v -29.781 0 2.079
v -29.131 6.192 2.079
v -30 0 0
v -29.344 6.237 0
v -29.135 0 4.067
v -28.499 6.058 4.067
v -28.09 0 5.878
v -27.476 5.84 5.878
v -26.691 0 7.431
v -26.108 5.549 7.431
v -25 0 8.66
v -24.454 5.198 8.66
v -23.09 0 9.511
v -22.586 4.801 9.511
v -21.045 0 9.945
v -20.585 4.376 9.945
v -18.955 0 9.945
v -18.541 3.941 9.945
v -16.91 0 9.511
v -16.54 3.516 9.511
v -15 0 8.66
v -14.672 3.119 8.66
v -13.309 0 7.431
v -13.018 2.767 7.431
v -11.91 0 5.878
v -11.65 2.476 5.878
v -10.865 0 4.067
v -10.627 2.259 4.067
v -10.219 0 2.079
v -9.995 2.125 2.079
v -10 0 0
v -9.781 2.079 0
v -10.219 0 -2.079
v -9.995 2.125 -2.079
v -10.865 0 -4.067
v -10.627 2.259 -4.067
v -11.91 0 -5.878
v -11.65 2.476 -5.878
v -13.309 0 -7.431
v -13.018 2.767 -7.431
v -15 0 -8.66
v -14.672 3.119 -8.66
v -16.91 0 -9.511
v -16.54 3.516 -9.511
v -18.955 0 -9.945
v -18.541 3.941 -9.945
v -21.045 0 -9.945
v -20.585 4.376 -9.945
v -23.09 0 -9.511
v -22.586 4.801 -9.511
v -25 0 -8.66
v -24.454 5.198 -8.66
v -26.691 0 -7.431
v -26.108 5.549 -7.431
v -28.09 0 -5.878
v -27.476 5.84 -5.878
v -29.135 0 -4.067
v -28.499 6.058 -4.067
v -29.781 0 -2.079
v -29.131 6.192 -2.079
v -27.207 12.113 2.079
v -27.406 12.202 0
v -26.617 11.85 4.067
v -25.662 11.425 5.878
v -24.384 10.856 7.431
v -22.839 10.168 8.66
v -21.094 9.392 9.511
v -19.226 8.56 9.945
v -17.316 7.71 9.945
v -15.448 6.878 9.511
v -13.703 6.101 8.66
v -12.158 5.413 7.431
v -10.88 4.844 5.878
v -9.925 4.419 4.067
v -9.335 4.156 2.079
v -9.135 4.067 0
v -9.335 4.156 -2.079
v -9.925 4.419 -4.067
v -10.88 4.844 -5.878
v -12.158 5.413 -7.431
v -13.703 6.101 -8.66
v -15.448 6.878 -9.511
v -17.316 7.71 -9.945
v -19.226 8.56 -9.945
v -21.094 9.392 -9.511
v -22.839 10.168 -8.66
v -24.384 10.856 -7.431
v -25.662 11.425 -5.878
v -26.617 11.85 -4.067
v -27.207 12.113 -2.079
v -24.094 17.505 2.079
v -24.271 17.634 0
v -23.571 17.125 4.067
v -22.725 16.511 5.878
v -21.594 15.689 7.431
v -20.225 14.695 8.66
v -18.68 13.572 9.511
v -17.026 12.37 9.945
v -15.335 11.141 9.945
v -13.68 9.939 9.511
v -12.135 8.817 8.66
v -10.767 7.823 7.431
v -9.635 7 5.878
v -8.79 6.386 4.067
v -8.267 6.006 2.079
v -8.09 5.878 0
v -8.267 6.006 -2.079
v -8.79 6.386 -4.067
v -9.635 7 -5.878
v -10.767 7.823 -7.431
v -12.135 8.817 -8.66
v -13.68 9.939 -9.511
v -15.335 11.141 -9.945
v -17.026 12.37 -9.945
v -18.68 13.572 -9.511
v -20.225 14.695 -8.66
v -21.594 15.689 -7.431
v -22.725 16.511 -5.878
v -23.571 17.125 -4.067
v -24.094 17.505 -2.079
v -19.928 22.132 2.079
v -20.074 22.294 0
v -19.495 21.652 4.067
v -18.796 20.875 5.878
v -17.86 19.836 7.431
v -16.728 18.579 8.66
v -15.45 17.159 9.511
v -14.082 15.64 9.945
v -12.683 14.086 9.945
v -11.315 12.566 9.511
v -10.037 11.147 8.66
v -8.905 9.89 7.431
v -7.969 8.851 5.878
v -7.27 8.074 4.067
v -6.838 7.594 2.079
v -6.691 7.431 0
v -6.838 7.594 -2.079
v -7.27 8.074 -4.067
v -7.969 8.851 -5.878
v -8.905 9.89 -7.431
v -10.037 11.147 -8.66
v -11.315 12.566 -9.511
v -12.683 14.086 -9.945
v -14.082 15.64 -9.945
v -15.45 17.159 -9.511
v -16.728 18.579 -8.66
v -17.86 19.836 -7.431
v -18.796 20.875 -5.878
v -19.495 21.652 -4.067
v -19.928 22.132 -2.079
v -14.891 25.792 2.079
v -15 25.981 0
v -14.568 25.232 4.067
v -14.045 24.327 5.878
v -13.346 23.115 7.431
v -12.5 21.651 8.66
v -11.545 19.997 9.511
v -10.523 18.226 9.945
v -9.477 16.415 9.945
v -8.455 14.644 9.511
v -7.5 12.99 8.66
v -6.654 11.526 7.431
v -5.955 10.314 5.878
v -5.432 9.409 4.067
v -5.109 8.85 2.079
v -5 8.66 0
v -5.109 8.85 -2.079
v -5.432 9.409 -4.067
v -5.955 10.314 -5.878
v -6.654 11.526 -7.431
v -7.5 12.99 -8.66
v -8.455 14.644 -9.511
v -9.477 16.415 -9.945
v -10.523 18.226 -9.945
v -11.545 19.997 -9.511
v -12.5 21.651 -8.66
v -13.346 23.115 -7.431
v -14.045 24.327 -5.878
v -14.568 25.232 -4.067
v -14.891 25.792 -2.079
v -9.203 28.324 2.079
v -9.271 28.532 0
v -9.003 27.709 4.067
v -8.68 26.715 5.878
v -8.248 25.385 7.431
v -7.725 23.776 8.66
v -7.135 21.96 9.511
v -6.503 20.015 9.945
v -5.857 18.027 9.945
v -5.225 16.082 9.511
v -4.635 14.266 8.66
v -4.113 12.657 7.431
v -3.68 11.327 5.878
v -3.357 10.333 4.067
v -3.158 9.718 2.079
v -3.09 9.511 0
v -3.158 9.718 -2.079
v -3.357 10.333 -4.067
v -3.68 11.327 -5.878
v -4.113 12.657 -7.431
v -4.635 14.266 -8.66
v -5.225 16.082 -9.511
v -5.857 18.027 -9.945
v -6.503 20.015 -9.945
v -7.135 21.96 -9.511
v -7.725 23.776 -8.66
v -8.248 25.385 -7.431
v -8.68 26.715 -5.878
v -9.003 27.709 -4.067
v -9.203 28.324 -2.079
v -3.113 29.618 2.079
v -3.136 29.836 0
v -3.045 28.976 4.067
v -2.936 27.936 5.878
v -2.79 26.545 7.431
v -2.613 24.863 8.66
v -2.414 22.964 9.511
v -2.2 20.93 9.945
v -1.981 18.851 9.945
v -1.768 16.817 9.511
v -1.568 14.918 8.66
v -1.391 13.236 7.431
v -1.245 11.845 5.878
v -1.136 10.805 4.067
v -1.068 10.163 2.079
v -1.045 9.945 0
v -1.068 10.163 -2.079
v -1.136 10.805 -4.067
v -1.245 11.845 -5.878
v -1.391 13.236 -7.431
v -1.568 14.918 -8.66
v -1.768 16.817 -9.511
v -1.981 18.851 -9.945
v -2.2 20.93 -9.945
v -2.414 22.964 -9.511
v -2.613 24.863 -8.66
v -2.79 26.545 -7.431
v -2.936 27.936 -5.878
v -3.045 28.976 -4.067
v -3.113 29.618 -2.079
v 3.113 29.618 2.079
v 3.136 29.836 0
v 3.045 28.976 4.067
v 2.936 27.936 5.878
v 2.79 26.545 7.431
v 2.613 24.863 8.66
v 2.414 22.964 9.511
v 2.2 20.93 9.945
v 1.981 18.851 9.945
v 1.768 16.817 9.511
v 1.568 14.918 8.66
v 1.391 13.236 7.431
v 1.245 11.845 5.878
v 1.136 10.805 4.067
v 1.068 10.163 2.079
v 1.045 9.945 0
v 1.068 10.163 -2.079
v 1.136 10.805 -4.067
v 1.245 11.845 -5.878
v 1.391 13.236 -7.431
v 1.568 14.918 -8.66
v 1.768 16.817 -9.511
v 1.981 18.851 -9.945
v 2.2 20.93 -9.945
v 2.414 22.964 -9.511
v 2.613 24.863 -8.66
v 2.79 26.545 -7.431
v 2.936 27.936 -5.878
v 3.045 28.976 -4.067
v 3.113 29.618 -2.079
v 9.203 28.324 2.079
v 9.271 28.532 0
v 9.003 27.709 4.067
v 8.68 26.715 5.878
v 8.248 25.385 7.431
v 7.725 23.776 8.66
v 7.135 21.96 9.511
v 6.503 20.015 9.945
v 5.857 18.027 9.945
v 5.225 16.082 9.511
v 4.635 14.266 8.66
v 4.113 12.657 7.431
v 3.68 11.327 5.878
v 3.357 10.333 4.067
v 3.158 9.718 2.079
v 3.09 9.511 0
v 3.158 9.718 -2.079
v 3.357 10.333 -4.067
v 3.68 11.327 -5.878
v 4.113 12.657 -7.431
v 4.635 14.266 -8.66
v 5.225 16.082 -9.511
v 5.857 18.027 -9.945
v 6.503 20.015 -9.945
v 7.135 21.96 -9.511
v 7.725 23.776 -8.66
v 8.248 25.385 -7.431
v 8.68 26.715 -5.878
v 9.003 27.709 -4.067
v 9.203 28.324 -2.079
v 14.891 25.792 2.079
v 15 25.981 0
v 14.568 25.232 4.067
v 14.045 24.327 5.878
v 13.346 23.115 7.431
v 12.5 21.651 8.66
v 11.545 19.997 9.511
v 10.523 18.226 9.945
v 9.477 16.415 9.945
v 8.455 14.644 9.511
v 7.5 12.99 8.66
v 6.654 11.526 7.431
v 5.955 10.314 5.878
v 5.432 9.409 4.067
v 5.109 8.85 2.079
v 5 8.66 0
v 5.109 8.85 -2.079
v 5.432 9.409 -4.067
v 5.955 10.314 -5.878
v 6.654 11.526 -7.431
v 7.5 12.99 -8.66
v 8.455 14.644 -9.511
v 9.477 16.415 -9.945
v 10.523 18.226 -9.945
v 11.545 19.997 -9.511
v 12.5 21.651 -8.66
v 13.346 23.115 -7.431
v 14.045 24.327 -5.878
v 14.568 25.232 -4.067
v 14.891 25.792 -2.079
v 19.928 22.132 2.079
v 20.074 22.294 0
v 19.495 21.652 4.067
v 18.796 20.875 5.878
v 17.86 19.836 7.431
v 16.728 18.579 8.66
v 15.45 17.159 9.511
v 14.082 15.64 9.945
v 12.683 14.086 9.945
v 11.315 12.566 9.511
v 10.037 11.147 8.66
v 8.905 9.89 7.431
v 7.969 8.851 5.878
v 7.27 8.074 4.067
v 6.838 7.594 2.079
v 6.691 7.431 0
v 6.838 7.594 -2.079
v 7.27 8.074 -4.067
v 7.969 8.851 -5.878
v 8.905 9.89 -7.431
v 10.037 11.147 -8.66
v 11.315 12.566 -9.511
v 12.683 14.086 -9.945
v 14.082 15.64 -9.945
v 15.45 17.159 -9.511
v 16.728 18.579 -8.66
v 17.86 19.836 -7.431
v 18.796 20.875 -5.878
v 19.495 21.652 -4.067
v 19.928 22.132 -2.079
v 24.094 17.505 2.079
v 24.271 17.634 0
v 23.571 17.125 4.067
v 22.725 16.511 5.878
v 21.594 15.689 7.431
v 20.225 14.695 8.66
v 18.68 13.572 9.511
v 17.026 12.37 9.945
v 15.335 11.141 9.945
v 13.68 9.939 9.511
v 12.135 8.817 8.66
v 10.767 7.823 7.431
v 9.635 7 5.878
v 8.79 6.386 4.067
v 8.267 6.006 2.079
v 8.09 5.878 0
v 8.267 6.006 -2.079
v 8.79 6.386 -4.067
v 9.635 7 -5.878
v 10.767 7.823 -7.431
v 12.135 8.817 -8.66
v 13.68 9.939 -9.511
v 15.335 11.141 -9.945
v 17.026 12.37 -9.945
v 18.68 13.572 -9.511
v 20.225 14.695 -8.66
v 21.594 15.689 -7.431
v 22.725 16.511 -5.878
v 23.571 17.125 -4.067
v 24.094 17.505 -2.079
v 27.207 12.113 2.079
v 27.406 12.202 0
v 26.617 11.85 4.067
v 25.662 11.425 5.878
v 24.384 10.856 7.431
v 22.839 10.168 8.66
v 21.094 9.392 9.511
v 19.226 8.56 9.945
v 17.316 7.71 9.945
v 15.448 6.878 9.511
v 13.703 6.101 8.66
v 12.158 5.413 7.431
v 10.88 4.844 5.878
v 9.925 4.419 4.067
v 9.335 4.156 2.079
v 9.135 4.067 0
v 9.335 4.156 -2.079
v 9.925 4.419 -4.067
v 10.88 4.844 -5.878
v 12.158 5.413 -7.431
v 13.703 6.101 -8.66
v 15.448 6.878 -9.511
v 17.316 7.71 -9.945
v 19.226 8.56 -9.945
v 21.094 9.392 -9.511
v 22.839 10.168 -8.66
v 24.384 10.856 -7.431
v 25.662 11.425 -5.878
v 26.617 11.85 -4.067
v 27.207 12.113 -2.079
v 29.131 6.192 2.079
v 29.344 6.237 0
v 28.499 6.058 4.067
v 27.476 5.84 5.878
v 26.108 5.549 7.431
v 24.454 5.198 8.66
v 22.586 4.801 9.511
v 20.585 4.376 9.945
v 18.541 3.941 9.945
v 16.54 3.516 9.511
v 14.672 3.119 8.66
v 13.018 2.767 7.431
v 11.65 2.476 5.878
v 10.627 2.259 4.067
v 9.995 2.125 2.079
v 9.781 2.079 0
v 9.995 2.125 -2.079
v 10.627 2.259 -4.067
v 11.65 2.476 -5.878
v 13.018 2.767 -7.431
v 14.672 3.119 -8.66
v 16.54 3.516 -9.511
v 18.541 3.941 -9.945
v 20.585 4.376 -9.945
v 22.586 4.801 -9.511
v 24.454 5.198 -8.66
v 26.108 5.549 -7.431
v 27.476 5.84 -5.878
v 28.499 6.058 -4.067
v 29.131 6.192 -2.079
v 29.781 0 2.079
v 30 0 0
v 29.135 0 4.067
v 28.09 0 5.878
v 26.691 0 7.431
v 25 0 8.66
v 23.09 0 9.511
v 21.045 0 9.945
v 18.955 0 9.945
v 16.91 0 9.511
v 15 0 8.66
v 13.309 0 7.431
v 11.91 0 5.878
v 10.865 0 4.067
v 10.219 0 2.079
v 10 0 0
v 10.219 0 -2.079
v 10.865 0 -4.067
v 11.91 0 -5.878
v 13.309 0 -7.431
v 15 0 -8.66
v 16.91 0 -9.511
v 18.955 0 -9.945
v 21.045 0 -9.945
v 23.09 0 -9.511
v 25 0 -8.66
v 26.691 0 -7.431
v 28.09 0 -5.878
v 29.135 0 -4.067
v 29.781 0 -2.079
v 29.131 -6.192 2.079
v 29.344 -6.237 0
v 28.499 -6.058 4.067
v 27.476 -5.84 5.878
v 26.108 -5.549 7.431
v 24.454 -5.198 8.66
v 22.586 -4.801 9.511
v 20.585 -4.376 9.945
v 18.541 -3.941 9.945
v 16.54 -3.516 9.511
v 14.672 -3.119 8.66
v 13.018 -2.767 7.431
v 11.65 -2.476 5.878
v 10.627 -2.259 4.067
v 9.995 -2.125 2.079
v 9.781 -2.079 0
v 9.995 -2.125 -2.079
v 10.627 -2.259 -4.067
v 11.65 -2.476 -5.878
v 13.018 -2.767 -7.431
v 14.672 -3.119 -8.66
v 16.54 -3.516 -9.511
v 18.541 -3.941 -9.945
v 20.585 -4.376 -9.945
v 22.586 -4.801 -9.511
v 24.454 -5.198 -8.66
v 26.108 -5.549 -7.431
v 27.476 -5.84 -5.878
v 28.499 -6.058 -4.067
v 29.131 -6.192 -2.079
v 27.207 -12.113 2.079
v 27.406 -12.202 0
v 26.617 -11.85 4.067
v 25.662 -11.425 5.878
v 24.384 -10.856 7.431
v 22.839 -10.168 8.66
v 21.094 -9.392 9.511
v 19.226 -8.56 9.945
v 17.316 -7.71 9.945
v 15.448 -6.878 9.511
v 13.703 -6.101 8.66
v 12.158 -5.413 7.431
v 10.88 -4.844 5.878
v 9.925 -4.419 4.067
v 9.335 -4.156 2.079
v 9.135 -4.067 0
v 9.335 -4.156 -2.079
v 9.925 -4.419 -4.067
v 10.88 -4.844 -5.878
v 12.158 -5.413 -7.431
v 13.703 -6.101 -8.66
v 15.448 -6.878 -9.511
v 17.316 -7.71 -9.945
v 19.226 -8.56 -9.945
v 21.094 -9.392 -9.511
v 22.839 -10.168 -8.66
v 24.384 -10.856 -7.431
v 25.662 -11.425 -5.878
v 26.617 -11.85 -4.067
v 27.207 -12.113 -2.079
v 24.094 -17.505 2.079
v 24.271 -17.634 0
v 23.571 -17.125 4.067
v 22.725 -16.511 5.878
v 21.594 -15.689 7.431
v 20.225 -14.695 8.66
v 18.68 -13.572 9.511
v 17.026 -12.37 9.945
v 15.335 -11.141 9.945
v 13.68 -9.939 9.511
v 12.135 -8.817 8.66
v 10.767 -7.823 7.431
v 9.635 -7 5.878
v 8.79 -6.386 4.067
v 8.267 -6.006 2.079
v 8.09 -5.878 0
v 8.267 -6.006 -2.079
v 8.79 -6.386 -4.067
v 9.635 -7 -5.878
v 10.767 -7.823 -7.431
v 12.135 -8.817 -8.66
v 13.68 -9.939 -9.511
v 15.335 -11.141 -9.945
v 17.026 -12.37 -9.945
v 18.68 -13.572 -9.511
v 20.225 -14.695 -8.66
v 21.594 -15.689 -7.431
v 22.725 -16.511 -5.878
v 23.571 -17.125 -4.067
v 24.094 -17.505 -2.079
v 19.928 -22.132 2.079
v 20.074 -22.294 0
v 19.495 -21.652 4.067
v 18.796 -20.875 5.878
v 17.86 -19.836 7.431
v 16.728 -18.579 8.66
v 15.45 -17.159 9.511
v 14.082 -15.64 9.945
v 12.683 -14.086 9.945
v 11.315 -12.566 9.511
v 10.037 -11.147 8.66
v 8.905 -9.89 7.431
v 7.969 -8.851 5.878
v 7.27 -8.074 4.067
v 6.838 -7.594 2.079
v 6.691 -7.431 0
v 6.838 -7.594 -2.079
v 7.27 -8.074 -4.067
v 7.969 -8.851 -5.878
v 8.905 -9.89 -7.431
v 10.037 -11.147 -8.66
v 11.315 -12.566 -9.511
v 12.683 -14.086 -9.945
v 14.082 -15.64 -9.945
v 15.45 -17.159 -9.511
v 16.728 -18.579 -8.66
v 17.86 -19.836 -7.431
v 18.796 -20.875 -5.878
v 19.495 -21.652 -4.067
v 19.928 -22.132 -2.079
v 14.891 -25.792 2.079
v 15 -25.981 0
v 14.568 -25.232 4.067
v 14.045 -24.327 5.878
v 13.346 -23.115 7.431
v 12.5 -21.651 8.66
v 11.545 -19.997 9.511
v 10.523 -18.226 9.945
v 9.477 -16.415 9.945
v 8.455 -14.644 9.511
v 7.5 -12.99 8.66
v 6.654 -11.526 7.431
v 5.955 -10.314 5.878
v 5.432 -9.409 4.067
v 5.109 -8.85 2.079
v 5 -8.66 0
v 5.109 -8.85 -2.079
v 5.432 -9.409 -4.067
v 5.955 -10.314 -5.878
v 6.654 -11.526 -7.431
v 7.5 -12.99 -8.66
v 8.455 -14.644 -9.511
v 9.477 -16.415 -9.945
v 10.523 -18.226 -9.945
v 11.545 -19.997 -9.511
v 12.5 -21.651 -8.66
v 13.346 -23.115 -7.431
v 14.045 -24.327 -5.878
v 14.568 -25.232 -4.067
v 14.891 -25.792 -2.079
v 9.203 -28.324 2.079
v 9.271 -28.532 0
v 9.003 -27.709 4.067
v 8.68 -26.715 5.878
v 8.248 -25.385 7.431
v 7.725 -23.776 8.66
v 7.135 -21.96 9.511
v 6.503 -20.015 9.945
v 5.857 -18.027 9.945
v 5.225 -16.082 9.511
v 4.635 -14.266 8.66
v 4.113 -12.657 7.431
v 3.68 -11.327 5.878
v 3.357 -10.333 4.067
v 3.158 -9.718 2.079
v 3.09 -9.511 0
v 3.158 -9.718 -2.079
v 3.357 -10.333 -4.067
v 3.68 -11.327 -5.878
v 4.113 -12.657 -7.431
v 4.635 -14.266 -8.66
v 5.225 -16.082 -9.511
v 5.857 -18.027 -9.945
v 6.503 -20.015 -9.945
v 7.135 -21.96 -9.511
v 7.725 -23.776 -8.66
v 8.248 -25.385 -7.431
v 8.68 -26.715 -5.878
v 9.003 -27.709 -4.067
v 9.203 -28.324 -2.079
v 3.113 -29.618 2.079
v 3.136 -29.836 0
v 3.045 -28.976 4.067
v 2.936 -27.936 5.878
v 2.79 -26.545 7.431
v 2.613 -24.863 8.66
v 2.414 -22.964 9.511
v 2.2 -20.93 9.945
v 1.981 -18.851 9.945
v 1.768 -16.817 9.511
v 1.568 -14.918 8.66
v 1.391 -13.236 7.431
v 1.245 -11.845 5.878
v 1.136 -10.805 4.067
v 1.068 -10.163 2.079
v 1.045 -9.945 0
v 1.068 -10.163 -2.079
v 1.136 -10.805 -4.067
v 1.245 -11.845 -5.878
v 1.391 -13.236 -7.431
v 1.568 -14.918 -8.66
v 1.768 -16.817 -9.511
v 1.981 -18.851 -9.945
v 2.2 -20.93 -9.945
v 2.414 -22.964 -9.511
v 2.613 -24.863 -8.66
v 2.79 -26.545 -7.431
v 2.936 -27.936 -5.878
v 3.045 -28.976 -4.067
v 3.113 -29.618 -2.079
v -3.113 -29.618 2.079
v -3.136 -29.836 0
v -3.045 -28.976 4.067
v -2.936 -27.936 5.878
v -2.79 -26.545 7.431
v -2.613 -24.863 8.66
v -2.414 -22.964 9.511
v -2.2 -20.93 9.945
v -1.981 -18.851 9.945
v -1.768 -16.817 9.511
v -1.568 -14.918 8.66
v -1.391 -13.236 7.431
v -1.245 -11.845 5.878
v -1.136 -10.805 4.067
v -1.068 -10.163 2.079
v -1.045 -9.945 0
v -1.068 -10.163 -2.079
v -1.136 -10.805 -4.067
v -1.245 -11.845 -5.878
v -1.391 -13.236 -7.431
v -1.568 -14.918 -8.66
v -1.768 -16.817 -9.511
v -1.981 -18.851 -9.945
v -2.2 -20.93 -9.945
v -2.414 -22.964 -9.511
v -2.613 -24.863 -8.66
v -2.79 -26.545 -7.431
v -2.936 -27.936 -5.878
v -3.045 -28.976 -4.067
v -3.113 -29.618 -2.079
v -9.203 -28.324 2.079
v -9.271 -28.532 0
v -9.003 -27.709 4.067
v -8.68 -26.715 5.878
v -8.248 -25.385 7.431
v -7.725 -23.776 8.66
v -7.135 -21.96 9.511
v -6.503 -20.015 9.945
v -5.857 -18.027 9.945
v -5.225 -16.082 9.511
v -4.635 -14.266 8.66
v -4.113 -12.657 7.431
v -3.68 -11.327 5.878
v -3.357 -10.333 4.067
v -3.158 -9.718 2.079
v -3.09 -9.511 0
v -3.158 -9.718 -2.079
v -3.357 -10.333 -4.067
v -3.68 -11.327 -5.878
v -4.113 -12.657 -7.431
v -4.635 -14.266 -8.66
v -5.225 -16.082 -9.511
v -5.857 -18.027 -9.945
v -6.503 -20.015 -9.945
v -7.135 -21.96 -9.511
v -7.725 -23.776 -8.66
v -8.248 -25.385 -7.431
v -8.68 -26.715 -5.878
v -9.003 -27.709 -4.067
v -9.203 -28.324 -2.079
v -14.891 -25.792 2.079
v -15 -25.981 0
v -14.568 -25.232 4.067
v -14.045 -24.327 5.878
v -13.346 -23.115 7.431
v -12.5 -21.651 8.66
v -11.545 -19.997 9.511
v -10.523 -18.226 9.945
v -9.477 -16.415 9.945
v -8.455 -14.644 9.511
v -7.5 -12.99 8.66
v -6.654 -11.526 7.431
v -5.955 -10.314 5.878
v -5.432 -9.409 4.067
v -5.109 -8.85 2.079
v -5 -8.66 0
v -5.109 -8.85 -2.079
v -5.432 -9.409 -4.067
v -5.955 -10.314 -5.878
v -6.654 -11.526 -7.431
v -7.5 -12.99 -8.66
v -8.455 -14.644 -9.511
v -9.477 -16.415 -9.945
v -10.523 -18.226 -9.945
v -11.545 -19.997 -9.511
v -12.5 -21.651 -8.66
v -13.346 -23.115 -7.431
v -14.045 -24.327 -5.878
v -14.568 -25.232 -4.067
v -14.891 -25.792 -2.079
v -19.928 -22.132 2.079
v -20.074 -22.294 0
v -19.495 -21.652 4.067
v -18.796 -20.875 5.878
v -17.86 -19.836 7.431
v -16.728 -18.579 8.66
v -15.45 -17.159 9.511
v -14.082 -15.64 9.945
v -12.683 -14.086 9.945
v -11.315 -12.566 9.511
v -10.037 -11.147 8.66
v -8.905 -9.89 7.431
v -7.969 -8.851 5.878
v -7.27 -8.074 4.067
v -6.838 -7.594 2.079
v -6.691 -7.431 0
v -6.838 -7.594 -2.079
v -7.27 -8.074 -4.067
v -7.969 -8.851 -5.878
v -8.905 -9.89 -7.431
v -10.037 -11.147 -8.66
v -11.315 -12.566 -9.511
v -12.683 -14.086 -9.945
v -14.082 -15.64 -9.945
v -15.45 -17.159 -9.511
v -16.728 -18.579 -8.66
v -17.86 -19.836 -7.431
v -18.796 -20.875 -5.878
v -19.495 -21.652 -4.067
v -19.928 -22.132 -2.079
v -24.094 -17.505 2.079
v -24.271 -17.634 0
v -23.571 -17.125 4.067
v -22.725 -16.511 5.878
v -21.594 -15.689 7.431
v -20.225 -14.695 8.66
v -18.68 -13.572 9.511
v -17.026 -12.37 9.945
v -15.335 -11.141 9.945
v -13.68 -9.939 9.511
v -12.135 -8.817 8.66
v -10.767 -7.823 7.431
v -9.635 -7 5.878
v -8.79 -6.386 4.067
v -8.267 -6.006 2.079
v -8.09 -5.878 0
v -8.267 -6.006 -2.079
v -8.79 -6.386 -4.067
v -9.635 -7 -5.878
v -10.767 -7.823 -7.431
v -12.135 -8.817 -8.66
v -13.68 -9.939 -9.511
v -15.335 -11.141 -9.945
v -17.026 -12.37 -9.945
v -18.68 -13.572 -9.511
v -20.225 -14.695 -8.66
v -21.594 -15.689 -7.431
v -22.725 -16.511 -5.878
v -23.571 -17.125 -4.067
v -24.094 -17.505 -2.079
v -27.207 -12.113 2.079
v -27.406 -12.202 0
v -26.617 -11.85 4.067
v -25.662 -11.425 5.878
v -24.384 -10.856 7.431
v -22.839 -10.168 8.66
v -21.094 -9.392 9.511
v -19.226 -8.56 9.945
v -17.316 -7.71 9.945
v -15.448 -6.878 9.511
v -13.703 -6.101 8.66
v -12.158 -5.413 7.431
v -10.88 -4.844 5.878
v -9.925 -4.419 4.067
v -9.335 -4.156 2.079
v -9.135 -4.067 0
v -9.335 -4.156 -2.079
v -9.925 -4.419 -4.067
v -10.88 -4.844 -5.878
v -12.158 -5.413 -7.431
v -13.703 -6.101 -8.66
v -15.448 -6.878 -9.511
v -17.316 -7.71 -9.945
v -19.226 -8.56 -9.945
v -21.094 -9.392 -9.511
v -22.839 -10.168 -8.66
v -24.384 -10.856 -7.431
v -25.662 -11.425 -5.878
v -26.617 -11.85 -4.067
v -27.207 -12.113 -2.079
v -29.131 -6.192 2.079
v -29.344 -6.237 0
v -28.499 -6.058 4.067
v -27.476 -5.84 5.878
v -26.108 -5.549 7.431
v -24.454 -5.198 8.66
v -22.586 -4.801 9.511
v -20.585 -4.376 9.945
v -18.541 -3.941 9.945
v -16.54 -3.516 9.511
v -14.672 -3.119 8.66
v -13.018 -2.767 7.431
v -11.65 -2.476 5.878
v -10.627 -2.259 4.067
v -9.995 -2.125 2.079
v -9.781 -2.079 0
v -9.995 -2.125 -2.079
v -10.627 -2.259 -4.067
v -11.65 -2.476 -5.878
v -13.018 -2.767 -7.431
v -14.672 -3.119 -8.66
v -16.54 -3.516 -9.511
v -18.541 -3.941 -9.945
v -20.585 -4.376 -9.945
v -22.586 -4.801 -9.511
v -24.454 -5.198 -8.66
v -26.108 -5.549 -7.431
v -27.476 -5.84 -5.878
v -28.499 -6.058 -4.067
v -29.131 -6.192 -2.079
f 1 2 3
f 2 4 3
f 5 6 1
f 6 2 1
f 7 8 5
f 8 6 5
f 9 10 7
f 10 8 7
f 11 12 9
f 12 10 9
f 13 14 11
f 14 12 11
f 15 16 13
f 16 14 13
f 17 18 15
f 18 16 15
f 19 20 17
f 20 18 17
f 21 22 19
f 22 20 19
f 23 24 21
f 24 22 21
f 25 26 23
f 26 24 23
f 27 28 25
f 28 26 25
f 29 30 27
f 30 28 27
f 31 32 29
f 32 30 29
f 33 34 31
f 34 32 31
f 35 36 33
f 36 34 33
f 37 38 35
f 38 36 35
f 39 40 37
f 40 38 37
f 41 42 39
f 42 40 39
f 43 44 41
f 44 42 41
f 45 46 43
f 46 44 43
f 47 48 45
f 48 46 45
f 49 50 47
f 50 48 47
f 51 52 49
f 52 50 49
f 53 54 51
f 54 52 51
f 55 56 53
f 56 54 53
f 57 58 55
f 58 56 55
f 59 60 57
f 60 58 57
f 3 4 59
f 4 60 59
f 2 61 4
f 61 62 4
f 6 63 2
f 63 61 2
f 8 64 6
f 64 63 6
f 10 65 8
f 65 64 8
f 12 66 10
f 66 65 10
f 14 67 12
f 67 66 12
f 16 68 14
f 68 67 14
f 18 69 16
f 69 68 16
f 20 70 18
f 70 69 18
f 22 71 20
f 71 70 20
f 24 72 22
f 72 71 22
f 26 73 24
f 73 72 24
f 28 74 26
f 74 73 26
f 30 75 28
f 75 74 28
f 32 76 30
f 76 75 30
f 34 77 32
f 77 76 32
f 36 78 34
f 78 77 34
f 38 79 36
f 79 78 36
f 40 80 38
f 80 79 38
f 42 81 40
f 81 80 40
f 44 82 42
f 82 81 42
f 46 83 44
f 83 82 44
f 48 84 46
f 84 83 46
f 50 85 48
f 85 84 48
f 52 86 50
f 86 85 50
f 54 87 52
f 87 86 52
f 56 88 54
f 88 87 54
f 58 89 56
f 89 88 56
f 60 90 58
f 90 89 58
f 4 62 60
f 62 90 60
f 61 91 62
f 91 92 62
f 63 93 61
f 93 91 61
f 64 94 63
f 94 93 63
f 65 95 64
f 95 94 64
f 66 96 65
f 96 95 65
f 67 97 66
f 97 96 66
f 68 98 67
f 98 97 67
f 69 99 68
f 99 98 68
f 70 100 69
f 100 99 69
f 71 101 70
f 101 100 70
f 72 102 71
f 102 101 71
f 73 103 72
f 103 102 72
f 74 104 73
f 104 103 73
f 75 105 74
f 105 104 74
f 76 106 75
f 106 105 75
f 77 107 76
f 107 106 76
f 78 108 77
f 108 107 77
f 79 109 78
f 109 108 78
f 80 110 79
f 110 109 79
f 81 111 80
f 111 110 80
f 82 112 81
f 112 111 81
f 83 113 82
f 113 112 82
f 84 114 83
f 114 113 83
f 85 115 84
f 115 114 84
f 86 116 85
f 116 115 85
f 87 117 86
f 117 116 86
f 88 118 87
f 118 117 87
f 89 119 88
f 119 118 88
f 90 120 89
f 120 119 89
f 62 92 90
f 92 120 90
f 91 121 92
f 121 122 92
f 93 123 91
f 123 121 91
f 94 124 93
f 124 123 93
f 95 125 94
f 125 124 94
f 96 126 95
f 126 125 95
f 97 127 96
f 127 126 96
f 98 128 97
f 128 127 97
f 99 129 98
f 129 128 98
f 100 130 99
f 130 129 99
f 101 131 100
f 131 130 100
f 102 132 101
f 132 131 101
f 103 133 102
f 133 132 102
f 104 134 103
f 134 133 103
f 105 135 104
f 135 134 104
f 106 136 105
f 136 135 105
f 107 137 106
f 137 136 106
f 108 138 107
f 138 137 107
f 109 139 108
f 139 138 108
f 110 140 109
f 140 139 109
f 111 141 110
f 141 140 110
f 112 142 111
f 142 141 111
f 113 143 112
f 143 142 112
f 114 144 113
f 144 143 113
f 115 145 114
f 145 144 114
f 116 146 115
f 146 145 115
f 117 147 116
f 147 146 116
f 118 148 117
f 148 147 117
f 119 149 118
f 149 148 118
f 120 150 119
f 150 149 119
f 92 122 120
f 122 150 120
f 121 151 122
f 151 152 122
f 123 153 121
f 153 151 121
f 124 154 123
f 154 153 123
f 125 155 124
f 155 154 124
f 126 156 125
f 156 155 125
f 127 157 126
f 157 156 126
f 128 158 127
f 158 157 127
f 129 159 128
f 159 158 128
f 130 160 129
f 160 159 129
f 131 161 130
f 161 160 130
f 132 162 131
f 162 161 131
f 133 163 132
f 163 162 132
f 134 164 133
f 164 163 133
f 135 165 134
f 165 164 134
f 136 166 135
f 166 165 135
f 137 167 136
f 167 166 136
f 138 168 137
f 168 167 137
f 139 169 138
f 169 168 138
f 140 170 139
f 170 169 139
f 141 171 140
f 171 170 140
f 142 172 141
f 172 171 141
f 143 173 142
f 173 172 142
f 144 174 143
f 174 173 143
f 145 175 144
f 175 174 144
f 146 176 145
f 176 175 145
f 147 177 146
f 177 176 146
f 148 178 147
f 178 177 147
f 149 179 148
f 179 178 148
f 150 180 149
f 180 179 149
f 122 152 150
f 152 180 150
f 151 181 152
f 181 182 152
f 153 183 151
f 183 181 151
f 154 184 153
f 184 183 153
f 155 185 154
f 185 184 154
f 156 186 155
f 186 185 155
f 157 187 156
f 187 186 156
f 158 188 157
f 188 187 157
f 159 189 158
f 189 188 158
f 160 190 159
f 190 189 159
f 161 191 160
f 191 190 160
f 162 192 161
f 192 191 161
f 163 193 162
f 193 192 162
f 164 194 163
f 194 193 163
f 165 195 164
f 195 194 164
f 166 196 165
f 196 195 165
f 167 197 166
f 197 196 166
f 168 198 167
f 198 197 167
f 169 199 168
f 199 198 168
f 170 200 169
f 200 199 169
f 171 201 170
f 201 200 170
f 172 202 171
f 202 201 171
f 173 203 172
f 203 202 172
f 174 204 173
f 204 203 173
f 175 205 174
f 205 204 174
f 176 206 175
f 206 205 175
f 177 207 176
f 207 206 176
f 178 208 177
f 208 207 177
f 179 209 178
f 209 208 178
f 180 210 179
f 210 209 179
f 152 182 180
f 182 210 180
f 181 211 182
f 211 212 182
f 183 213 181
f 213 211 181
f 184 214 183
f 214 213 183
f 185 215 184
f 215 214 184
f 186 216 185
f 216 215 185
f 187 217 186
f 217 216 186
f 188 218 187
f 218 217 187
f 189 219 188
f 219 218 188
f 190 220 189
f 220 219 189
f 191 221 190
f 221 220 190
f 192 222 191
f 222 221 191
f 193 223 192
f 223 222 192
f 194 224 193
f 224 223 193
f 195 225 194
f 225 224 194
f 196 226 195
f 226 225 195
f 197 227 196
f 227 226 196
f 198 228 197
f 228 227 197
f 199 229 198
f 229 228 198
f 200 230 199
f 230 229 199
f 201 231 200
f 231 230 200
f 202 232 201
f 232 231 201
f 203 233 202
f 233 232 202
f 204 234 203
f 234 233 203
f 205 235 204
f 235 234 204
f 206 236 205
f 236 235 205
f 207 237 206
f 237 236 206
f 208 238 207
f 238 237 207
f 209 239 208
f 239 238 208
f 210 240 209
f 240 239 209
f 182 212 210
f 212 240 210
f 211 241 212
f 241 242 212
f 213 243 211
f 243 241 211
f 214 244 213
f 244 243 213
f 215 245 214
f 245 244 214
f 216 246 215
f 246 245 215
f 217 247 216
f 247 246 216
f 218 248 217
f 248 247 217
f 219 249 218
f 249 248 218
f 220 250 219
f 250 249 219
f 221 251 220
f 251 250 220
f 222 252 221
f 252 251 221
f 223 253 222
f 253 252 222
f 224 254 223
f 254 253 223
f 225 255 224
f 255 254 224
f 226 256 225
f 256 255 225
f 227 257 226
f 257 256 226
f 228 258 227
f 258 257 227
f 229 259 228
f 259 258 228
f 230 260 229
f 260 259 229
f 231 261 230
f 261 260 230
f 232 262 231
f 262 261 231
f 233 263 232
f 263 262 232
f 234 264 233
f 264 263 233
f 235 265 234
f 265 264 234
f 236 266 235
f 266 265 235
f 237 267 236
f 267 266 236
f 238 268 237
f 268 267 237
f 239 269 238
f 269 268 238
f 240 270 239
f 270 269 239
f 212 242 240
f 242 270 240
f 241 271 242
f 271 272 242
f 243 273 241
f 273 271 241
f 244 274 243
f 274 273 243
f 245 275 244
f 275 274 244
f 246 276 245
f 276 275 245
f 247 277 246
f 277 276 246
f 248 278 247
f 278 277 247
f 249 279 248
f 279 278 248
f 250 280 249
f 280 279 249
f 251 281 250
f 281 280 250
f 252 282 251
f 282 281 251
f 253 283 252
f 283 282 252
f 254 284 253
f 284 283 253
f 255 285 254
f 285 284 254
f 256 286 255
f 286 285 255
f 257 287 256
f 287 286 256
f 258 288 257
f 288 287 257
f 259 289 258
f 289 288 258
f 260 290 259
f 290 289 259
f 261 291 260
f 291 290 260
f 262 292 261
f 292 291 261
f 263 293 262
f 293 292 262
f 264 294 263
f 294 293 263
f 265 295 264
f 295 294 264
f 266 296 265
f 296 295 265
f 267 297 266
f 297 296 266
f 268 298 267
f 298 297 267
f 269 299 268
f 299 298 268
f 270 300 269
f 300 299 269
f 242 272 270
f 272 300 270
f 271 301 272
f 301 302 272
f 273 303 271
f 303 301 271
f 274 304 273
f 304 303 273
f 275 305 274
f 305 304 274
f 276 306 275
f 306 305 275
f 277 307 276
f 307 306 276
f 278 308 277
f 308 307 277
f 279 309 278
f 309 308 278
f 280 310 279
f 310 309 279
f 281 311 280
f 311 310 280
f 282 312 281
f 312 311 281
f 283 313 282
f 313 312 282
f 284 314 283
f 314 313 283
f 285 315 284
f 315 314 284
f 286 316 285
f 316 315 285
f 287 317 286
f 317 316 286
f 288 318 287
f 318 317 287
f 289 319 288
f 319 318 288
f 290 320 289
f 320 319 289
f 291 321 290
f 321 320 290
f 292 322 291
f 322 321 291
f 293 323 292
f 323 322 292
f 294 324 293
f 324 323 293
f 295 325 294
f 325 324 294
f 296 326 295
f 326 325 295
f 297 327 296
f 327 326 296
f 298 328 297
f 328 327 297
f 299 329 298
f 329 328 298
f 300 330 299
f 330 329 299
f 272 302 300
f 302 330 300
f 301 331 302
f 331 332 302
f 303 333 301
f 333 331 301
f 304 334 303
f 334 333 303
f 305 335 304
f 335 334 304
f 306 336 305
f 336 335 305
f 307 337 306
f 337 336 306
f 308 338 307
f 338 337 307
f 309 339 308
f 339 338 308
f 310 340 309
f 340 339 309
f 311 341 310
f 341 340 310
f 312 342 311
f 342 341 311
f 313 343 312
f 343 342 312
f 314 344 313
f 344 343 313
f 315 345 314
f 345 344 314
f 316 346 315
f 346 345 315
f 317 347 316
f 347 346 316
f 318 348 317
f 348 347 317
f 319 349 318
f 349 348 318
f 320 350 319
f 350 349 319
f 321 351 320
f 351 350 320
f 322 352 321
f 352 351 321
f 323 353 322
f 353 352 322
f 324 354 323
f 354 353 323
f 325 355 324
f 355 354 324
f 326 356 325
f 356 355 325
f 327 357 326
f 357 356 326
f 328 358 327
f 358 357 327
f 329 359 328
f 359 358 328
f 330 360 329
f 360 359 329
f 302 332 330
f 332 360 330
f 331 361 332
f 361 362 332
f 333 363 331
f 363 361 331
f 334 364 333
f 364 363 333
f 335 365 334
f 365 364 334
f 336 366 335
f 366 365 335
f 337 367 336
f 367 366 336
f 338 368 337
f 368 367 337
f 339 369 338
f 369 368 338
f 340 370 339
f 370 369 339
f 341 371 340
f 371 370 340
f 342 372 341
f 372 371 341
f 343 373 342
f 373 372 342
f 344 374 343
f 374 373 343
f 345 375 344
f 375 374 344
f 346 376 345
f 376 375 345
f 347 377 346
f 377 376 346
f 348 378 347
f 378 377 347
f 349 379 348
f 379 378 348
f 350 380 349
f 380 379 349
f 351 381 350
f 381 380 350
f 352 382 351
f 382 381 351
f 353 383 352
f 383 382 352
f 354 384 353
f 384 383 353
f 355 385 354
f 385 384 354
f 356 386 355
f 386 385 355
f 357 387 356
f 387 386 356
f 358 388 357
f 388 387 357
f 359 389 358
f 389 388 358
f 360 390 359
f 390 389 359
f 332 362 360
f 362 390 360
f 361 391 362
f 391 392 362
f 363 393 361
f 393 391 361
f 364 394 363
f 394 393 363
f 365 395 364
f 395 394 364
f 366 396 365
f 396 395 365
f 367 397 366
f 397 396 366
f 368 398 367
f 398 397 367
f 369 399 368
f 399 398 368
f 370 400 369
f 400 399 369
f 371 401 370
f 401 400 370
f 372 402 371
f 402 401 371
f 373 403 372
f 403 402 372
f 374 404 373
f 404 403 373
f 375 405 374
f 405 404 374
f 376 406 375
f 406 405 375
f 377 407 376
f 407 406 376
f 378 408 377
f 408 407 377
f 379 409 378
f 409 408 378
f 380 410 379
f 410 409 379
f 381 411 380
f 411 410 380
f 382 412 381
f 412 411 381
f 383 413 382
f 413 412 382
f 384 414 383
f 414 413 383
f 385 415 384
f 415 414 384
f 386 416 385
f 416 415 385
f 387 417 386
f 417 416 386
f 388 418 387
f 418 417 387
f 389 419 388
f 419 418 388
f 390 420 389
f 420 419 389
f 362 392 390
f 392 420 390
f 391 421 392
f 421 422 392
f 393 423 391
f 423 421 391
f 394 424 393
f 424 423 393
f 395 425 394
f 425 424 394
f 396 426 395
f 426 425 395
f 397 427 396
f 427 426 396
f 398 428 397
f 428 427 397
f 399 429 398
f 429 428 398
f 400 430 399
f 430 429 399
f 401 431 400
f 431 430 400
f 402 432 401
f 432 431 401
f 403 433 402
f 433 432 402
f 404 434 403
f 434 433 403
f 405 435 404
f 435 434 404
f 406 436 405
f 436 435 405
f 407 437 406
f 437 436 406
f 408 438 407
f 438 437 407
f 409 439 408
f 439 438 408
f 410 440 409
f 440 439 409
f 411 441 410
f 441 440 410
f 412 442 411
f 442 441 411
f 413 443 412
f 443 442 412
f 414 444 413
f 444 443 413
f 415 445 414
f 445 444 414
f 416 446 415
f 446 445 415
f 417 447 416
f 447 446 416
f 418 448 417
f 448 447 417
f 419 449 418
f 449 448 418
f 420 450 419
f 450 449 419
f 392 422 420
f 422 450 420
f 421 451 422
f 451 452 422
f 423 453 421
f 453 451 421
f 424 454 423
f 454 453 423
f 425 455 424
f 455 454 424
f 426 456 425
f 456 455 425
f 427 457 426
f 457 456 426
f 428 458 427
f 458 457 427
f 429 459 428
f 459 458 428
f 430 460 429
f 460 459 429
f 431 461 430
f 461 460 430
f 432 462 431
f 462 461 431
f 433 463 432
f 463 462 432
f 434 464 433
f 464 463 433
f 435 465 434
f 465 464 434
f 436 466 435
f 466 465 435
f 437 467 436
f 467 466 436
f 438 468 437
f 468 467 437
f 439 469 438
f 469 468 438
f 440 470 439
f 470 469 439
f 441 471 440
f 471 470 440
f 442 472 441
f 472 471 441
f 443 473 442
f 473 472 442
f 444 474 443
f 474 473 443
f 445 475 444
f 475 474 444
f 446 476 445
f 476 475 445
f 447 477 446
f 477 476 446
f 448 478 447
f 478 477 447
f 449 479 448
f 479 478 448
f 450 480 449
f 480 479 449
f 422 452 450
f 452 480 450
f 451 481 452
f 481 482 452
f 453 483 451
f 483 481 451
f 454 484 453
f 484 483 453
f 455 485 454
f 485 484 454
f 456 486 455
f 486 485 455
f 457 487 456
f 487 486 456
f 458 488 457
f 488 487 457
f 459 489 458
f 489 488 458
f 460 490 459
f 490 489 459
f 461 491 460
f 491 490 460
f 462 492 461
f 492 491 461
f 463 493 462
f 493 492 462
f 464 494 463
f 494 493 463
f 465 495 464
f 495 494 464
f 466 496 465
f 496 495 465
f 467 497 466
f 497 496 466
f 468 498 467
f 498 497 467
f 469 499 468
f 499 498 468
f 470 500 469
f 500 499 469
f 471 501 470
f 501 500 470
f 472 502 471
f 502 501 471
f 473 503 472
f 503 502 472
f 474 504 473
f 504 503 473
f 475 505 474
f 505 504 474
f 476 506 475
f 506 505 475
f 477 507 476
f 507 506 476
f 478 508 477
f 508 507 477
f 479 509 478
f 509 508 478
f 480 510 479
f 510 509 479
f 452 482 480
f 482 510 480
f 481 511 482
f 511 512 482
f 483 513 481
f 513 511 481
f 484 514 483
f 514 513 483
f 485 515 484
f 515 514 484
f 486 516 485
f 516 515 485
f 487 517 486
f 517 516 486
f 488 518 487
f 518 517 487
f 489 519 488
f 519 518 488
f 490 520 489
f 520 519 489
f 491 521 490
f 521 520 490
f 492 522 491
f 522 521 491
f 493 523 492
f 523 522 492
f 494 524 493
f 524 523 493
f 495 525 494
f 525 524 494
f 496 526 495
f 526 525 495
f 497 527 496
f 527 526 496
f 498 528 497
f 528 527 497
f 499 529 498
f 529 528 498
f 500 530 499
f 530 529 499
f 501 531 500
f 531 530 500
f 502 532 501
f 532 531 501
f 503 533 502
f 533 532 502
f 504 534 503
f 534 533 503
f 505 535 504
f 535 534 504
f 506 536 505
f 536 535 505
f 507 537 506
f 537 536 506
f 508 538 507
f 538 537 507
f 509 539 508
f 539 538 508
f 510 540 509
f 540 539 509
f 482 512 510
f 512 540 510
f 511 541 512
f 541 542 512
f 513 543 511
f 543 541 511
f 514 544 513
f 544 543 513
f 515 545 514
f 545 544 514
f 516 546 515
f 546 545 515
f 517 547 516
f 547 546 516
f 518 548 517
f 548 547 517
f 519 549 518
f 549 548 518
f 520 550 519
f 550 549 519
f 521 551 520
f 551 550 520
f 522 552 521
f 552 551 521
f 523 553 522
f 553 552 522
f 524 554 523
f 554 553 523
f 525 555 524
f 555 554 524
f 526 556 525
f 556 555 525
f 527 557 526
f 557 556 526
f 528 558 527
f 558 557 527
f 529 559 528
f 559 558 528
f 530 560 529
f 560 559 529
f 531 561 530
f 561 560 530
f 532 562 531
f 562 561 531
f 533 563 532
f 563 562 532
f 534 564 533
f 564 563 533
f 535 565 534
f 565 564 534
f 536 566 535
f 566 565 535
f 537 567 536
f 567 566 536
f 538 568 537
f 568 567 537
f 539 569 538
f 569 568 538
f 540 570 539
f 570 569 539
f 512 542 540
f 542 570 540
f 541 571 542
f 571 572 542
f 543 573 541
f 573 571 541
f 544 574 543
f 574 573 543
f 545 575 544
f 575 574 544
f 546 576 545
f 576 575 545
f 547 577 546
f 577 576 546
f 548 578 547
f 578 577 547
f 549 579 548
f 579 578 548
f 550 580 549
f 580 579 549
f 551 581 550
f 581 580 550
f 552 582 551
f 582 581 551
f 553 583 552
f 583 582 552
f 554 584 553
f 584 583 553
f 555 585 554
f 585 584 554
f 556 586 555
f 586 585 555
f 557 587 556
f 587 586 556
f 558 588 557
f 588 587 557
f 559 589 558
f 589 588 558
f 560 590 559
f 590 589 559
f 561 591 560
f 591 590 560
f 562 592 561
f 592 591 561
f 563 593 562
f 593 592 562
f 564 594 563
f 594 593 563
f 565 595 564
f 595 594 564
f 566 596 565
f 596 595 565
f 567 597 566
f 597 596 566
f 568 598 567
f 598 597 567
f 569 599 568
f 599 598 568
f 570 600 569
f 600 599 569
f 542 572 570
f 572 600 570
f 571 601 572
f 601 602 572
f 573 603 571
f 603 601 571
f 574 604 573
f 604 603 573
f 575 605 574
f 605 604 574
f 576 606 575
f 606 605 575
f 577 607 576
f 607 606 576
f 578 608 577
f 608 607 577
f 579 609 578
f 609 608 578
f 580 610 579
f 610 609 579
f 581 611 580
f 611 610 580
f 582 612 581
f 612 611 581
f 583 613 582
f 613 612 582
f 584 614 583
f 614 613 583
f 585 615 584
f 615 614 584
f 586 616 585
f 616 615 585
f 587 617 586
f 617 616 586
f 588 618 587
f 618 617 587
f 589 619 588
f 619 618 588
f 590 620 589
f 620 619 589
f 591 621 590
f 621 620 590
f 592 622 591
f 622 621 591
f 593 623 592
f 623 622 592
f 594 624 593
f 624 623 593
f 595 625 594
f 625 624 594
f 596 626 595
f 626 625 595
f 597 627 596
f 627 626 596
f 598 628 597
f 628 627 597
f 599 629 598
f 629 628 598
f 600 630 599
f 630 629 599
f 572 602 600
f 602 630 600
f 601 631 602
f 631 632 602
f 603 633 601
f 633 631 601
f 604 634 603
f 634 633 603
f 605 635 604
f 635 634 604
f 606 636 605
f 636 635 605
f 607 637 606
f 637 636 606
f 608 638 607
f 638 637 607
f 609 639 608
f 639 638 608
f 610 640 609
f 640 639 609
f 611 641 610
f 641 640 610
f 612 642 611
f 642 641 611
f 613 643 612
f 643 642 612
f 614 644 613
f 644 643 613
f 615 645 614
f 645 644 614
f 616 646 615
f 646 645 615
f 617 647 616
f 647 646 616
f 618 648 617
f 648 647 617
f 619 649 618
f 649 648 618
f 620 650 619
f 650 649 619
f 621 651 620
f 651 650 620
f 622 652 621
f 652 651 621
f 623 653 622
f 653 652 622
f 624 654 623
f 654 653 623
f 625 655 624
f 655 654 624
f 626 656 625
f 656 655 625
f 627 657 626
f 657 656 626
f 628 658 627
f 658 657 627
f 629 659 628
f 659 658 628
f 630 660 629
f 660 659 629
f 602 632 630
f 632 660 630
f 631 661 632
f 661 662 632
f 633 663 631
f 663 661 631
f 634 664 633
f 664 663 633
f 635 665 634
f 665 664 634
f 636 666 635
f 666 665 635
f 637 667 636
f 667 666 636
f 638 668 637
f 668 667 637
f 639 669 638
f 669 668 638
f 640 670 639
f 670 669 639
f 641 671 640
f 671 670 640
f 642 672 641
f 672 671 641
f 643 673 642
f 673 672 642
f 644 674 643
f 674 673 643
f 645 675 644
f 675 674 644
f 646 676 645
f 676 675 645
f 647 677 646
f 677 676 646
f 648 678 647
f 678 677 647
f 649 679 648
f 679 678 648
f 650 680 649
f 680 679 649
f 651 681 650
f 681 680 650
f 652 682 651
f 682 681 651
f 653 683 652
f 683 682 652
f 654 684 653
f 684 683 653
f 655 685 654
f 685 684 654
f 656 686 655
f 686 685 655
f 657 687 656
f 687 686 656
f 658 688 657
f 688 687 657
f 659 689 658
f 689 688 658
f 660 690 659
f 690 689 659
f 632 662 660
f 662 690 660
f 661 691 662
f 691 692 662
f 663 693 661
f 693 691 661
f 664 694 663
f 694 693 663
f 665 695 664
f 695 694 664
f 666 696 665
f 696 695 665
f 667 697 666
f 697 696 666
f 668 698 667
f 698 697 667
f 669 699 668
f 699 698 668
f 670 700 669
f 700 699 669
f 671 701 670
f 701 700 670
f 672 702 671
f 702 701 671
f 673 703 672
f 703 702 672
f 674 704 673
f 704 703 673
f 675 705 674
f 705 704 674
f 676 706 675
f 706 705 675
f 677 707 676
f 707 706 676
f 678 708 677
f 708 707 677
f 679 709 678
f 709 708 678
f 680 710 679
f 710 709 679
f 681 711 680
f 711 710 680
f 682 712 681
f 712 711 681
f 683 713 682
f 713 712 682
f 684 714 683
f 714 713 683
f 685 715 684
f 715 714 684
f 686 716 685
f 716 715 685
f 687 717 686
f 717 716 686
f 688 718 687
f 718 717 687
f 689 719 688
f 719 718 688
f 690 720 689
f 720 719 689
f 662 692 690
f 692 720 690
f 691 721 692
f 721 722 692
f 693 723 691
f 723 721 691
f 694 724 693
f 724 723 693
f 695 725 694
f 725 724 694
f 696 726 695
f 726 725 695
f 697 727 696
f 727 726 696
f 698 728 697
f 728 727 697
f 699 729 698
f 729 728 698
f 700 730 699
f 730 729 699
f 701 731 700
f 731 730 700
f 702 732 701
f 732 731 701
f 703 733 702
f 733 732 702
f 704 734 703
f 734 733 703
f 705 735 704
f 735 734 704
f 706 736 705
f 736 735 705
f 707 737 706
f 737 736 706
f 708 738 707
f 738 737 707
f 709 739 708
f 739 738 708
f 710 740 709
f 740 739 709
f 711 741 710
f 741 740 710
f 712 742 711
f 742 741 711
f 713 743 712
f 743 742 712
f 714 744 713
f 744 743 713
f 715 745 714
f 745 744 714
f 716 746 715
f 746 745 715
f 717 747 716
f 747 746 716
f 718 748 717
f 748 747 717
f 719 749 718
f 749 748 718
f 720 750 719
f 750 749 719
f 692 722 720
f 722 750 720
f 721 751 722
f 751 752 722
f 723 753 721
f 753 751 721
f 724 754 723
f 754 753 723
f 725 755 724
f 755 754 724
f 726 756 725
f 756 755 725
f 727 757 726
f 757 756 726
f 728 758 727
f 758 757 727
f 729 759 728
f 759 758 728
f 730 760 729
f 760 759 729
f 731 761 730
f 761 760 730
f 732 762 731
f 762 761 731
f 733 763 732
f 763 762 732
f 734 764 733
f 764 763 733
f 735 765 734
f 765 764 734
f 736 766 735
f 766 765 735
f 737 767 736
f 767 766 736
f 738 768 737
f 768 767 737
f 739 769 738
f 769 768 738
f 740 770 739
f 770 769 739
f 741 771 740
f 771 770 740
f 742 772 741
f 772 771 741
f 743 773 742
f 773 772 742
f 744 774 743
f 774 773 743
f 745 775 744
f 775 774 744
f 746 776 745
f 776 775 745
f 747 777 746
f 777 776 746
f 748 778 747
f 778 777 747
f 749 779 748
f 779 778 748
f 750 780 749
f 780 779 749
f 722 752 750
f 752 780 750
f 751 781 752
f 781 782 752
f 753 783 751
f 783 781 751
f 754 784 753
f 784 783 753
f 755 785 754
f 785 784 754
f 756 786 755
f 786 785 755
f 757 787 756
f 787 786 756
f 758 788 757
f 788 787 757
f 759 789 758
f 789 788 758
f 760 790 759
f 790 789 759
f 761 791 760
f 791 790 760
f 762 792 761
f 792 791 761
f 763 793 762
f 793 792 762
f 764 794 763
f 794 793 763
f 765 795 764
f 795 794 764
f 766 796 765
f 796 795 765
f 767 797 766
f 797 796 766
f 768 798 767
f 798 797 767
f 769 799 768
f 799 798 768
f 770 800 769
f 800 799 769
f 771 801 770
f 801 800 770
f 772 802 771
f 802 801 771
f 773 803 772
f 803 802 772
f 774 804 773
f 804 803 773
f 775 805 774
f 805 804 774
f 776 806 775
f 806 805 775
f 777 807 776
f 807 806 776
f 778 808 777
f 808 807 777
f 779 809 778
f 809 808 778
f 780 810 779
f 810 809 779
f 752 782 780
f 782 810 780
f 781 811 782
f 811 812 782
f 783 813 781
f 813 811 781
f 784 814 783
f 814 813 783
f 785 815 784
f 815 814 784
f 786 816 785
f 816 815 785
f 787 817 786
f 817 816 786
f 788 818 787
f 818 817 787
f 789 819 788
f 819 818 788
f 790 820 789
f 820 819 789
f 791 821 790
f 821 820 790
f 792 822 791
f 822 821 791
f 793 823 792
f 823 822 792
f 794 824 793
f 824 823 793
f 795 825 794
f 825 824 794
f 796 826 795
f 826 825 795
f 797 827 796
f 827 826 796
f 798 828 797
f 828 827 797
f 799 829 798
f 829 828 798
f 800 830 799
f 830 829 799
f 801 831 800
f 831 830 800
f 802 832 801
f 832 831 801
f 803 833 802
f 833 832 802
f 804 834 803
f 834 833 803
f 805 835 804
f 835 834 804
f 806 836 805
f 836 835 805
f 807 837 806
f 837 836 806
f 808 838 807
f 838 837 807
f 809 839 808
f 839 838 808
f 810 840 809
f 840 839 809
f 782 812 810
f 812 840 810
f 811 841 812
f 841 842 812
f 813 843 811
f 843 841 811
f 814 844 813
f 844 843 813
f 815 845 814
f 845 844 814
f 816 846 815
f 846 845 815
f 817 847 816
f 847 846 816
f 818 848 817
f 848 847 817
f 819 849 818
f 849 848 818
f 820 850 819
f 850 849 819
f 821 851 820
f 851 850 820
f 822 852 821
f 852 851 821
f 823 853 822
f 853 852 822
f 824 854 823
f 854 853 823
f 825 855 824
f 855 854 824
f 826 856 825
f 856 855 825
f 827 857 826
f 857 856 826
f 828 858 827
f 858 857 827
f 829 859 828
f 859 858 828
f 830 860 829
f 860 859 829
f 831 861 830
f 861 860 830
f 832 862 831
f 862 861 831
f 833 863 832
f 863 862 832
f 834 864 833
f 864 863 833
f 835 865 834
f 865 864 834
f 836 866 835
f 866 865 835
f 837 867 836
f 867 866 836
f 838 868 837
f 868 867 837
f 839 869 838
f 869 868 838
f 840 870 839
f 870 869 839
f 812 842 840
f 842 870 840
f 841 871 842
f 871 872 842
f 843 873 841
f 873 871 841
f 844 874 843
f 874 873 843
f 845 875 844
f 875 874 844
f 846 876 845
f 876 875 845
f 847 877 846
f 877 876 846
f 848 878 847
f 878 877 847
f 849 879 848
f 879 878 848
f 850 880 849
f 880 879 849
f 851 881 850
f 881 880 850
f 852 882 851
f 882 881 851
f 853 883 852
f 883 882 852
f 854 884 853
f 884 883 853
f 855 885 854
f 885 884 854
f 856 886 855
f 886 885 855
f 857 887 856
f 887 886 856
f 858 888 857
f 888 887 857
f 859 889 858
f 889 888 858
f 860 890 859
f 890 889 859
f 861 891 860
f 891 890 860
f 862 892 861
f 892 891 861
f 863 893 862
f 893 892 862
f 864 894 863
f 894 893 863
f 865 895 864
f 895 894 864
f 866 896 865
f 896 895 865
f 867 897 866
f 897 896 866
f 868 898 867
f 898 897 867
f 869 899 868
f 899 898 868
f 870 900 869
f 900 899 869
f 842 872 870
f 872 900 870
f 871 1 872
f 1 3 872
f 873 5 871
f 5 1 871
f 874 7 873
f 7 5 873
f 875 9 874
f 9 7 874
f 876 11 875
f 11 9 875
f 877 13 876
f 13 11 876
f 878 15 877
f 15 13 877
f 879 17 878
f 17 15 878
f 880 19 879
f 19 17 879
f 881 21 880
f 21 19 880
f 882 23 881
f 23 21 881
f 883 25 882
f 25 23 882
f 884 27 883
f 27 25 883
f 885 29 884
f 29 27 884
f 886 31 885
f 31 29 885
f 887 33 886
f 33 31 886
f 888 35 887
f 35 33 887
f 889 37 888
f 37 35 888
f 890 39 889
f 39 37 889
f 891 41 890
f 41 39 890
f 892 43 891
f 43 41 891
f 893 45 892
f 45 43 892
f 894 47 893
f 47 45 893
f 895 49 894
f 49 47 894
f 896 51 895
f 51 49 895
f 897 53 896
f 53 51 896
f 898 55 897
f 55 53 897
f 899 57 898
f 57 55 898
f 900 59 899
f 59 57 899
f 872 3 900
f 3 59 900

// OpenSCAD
//extrude

//linear_extrude(height=10,scale=0,twist=45)
//circle(r=10,$fn=100);

//MIRROR

/*mirror([1,0,0]){}

translate([5,0,0]) //-------------->original
cube([2,2,10],center=true);

mirror([1,0,0]){  //--------------->espejo 1
    translate([5,0,0])
    cube([2,2,10],center=true);
}

mirror([0,1,0]){    //-------------espejo 2
    translate([5,5,0])
    cube([2,2,10],center=true);
    
    mirror([1,0,0]){
    translate([5,5,0])  //------espejo del espejo 2
    cube([2,2,10],center=true);
}

}*/

//GENERAR MÓDULOS

/*module cuadrado(radio=10){
    square([radio,radio]);
}

use<cuadrado.scad>  //lo pone disponible
//include<cuadradi.scad> //lo dibuja
cuadrado(5);
*/




//EXTRUDE DIA 4

rotate_extrude($fn=30)
translate([20,0,0])
//square([10,10],center=true);
circle(r=10,$fn=30);
